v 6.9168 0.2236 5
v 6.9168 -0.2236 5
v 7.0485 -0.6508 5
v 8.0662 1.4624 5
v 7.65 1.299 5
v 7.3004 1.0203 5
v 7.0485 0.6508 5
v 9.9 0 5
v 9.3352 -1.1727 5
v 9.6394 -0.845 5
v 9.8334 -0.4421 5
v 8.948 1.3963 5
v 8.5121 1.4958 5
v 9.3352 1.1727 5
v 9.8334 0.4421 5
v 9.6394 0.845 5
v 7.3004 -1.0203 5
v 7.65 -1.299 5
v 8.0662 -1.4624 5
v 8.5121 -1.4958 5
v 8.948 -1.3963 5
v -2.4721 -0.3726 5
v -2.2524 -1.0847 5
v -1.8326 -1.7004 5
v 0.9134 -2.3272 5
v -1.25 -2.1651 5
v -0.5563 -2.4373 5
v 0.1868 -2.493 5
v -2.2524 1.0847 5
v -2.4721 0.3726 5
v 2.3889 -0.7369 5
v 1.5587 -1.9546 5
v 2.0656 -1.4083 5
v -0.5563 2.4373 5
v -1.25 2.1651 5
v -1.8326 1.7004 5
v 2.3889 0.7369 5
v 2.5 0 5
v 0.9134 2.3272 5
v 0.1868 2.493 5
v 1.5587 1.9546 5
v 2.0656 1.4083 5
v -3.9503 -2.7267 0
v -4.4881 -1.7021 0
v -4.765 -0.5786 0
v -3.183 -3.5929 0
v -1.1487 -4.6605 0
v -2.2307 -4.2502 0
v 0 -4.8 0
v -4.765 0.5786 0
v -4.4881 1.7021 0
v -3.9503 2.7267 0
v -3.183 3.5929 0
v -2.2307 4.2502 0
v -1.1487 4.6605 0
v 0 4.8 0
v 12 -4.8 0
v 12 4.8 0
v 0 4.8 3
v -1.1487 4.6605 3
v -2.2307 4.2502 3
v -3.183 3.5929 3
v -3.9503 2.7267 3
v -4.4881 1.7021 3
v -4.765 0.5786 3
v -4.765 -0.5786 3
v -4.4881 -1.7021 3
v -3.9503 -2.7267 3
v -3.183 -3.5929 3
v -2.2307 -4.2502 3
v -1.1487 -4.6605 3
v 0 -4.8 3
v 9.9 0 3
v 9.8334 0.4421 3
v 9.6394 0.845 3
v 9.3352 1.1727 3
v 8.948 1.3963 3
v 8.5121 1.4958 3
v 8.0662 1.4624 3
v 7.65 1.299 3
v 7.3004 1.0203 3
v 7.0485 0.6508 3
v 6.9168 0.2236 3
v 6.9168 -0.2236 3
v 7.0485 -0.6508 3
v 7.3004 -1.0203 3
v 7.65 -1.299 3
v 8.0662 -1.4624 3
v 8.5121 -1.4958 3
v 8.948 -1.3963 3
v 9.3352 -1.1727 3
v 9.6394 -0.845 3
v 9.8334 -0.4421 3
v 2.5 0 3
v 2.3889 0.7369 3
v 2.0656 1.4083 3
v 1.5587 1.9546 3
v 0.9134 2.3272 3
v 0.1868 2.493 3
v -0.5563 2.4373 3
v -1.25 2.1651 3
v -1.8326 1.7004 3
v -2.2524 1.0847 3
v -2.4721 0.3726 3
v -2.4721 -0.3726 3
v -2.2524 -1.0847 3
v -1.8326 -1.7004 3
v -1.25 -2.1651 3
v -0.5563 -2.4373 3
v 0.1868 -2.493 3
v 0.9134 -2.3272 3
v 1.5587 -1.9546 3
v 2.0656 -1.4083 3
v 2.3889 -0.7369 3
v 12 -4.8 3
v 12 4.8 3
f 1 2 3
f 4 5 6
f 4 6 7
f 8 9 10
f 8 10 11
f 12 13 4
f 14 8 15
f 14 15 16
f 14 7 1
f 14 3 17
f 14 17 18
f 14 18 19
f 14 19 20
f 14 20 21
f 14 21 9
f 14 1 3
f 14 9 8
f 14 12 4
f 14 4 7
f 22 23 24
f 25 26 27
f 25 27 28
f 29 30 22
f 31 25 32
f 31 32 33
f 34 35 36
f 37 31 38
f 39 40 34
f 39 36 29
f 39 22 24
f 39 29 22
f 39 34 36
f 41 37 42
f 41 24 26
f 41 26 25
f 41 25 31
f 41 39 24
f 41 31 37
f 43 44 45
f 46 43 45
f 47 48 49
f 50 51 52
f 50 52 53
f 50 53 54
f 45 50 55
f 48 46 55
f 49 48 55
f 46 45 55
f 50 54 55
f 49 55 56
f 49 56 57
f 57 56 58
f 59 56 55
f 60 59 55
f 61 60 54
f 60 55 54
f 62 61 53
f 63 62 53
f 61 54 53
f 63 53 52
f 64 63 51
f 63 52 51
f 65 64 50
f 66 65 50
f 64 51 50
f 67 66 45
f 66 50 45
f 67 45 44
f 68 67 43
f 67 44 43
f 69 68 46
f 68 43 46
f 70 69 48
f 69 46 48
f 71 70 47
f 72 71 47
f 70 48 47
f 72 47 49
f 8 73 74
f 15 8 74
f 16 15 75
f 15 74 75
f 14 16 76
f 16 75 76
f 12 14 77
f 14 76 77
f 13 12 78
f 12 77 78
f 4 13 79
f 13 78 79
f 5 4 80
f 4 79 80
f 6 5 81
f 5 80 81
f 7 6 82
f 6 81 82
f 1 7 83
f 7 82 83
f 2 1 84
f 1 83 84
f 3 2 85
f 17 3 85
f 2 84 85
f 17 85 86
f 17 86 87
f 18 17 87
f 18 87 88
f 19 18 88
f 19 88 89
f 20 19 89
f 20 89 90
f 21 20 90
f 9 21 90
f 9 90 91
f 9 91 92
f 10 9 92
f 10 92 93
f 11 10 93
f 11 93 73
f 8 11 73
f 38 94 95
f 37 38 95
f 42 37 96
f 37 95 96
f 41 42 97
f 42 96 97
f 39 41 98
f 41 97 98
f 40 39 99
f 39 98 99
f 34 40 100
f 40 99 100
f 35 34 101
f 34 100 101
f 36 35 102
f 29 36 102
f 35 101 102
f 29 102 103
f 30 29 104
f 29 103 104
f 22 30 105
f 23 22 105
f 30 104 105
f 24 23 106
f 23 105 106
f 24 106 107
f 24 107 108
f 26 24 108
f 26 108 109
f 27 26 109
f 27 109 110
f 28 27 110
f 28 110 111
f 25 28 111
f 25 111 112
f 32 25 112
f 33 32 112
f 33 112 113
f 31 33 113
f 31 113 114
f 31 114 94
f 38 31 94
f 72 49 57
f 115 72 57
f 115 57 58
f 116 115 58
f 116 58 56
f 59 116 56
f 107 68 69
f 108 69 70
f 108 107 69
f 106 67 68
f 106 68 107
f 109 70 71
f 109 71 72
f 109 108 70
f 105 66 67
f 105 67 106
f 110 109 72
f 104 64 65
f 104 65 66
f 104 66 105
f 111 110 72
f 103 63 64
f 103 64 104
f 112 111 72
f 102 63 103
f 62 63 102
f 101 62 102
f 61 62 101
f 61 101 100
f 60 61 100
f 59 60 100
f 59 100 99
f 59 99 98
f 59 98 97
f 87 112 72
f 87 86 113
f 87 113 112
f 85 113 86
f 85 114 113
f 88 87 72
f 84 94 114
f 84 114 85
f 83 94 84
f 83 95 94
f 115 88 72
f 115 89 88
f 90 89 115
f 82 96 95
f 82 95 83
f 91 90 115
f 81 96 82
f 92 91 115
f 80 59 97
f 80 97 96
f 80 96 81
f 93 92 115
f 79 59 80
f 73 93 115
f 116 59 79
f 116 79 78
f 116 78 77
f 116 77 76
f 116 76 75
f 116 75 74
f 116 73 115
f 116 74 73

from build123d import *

# Parameters (mm, degrees)
BOSS_EXTRUDE1_DEPTH = 3
SKETCH2_R           = 2.5
SKETCH2_R_2         = 1.5
BOSS_EXTRUDE2_DEPTH = 5


with BuildPart() as part:
    # Sketch3 → Boss-Extrude1 (new body)
    with BuildSketch(Plane.XY):
        with BuildLine():
            Line((0, -4.8), (12, -4.8))
            Line((12, -4.8), (12, 4.8))
            Line((12, 4.8), (0, 4.8))
            ThreePointArc((0, 4.8), (-4.8, 0), (0, -4.8))
        make_face()
    extrude(amount=BOSS_EXTRUDE1_DEPTH)

    # Sketch2 → Boss-Extrude2 (add)
    with BuildSketch(Plane.XY):
        Circle(SKETCH2_R)
        with Locations((8.4, 0)):
            Circle(SKETCH2_R_2)
    extrude(amount=BOSS_EXTRUDE2_DEPTH)


solid = part.part
